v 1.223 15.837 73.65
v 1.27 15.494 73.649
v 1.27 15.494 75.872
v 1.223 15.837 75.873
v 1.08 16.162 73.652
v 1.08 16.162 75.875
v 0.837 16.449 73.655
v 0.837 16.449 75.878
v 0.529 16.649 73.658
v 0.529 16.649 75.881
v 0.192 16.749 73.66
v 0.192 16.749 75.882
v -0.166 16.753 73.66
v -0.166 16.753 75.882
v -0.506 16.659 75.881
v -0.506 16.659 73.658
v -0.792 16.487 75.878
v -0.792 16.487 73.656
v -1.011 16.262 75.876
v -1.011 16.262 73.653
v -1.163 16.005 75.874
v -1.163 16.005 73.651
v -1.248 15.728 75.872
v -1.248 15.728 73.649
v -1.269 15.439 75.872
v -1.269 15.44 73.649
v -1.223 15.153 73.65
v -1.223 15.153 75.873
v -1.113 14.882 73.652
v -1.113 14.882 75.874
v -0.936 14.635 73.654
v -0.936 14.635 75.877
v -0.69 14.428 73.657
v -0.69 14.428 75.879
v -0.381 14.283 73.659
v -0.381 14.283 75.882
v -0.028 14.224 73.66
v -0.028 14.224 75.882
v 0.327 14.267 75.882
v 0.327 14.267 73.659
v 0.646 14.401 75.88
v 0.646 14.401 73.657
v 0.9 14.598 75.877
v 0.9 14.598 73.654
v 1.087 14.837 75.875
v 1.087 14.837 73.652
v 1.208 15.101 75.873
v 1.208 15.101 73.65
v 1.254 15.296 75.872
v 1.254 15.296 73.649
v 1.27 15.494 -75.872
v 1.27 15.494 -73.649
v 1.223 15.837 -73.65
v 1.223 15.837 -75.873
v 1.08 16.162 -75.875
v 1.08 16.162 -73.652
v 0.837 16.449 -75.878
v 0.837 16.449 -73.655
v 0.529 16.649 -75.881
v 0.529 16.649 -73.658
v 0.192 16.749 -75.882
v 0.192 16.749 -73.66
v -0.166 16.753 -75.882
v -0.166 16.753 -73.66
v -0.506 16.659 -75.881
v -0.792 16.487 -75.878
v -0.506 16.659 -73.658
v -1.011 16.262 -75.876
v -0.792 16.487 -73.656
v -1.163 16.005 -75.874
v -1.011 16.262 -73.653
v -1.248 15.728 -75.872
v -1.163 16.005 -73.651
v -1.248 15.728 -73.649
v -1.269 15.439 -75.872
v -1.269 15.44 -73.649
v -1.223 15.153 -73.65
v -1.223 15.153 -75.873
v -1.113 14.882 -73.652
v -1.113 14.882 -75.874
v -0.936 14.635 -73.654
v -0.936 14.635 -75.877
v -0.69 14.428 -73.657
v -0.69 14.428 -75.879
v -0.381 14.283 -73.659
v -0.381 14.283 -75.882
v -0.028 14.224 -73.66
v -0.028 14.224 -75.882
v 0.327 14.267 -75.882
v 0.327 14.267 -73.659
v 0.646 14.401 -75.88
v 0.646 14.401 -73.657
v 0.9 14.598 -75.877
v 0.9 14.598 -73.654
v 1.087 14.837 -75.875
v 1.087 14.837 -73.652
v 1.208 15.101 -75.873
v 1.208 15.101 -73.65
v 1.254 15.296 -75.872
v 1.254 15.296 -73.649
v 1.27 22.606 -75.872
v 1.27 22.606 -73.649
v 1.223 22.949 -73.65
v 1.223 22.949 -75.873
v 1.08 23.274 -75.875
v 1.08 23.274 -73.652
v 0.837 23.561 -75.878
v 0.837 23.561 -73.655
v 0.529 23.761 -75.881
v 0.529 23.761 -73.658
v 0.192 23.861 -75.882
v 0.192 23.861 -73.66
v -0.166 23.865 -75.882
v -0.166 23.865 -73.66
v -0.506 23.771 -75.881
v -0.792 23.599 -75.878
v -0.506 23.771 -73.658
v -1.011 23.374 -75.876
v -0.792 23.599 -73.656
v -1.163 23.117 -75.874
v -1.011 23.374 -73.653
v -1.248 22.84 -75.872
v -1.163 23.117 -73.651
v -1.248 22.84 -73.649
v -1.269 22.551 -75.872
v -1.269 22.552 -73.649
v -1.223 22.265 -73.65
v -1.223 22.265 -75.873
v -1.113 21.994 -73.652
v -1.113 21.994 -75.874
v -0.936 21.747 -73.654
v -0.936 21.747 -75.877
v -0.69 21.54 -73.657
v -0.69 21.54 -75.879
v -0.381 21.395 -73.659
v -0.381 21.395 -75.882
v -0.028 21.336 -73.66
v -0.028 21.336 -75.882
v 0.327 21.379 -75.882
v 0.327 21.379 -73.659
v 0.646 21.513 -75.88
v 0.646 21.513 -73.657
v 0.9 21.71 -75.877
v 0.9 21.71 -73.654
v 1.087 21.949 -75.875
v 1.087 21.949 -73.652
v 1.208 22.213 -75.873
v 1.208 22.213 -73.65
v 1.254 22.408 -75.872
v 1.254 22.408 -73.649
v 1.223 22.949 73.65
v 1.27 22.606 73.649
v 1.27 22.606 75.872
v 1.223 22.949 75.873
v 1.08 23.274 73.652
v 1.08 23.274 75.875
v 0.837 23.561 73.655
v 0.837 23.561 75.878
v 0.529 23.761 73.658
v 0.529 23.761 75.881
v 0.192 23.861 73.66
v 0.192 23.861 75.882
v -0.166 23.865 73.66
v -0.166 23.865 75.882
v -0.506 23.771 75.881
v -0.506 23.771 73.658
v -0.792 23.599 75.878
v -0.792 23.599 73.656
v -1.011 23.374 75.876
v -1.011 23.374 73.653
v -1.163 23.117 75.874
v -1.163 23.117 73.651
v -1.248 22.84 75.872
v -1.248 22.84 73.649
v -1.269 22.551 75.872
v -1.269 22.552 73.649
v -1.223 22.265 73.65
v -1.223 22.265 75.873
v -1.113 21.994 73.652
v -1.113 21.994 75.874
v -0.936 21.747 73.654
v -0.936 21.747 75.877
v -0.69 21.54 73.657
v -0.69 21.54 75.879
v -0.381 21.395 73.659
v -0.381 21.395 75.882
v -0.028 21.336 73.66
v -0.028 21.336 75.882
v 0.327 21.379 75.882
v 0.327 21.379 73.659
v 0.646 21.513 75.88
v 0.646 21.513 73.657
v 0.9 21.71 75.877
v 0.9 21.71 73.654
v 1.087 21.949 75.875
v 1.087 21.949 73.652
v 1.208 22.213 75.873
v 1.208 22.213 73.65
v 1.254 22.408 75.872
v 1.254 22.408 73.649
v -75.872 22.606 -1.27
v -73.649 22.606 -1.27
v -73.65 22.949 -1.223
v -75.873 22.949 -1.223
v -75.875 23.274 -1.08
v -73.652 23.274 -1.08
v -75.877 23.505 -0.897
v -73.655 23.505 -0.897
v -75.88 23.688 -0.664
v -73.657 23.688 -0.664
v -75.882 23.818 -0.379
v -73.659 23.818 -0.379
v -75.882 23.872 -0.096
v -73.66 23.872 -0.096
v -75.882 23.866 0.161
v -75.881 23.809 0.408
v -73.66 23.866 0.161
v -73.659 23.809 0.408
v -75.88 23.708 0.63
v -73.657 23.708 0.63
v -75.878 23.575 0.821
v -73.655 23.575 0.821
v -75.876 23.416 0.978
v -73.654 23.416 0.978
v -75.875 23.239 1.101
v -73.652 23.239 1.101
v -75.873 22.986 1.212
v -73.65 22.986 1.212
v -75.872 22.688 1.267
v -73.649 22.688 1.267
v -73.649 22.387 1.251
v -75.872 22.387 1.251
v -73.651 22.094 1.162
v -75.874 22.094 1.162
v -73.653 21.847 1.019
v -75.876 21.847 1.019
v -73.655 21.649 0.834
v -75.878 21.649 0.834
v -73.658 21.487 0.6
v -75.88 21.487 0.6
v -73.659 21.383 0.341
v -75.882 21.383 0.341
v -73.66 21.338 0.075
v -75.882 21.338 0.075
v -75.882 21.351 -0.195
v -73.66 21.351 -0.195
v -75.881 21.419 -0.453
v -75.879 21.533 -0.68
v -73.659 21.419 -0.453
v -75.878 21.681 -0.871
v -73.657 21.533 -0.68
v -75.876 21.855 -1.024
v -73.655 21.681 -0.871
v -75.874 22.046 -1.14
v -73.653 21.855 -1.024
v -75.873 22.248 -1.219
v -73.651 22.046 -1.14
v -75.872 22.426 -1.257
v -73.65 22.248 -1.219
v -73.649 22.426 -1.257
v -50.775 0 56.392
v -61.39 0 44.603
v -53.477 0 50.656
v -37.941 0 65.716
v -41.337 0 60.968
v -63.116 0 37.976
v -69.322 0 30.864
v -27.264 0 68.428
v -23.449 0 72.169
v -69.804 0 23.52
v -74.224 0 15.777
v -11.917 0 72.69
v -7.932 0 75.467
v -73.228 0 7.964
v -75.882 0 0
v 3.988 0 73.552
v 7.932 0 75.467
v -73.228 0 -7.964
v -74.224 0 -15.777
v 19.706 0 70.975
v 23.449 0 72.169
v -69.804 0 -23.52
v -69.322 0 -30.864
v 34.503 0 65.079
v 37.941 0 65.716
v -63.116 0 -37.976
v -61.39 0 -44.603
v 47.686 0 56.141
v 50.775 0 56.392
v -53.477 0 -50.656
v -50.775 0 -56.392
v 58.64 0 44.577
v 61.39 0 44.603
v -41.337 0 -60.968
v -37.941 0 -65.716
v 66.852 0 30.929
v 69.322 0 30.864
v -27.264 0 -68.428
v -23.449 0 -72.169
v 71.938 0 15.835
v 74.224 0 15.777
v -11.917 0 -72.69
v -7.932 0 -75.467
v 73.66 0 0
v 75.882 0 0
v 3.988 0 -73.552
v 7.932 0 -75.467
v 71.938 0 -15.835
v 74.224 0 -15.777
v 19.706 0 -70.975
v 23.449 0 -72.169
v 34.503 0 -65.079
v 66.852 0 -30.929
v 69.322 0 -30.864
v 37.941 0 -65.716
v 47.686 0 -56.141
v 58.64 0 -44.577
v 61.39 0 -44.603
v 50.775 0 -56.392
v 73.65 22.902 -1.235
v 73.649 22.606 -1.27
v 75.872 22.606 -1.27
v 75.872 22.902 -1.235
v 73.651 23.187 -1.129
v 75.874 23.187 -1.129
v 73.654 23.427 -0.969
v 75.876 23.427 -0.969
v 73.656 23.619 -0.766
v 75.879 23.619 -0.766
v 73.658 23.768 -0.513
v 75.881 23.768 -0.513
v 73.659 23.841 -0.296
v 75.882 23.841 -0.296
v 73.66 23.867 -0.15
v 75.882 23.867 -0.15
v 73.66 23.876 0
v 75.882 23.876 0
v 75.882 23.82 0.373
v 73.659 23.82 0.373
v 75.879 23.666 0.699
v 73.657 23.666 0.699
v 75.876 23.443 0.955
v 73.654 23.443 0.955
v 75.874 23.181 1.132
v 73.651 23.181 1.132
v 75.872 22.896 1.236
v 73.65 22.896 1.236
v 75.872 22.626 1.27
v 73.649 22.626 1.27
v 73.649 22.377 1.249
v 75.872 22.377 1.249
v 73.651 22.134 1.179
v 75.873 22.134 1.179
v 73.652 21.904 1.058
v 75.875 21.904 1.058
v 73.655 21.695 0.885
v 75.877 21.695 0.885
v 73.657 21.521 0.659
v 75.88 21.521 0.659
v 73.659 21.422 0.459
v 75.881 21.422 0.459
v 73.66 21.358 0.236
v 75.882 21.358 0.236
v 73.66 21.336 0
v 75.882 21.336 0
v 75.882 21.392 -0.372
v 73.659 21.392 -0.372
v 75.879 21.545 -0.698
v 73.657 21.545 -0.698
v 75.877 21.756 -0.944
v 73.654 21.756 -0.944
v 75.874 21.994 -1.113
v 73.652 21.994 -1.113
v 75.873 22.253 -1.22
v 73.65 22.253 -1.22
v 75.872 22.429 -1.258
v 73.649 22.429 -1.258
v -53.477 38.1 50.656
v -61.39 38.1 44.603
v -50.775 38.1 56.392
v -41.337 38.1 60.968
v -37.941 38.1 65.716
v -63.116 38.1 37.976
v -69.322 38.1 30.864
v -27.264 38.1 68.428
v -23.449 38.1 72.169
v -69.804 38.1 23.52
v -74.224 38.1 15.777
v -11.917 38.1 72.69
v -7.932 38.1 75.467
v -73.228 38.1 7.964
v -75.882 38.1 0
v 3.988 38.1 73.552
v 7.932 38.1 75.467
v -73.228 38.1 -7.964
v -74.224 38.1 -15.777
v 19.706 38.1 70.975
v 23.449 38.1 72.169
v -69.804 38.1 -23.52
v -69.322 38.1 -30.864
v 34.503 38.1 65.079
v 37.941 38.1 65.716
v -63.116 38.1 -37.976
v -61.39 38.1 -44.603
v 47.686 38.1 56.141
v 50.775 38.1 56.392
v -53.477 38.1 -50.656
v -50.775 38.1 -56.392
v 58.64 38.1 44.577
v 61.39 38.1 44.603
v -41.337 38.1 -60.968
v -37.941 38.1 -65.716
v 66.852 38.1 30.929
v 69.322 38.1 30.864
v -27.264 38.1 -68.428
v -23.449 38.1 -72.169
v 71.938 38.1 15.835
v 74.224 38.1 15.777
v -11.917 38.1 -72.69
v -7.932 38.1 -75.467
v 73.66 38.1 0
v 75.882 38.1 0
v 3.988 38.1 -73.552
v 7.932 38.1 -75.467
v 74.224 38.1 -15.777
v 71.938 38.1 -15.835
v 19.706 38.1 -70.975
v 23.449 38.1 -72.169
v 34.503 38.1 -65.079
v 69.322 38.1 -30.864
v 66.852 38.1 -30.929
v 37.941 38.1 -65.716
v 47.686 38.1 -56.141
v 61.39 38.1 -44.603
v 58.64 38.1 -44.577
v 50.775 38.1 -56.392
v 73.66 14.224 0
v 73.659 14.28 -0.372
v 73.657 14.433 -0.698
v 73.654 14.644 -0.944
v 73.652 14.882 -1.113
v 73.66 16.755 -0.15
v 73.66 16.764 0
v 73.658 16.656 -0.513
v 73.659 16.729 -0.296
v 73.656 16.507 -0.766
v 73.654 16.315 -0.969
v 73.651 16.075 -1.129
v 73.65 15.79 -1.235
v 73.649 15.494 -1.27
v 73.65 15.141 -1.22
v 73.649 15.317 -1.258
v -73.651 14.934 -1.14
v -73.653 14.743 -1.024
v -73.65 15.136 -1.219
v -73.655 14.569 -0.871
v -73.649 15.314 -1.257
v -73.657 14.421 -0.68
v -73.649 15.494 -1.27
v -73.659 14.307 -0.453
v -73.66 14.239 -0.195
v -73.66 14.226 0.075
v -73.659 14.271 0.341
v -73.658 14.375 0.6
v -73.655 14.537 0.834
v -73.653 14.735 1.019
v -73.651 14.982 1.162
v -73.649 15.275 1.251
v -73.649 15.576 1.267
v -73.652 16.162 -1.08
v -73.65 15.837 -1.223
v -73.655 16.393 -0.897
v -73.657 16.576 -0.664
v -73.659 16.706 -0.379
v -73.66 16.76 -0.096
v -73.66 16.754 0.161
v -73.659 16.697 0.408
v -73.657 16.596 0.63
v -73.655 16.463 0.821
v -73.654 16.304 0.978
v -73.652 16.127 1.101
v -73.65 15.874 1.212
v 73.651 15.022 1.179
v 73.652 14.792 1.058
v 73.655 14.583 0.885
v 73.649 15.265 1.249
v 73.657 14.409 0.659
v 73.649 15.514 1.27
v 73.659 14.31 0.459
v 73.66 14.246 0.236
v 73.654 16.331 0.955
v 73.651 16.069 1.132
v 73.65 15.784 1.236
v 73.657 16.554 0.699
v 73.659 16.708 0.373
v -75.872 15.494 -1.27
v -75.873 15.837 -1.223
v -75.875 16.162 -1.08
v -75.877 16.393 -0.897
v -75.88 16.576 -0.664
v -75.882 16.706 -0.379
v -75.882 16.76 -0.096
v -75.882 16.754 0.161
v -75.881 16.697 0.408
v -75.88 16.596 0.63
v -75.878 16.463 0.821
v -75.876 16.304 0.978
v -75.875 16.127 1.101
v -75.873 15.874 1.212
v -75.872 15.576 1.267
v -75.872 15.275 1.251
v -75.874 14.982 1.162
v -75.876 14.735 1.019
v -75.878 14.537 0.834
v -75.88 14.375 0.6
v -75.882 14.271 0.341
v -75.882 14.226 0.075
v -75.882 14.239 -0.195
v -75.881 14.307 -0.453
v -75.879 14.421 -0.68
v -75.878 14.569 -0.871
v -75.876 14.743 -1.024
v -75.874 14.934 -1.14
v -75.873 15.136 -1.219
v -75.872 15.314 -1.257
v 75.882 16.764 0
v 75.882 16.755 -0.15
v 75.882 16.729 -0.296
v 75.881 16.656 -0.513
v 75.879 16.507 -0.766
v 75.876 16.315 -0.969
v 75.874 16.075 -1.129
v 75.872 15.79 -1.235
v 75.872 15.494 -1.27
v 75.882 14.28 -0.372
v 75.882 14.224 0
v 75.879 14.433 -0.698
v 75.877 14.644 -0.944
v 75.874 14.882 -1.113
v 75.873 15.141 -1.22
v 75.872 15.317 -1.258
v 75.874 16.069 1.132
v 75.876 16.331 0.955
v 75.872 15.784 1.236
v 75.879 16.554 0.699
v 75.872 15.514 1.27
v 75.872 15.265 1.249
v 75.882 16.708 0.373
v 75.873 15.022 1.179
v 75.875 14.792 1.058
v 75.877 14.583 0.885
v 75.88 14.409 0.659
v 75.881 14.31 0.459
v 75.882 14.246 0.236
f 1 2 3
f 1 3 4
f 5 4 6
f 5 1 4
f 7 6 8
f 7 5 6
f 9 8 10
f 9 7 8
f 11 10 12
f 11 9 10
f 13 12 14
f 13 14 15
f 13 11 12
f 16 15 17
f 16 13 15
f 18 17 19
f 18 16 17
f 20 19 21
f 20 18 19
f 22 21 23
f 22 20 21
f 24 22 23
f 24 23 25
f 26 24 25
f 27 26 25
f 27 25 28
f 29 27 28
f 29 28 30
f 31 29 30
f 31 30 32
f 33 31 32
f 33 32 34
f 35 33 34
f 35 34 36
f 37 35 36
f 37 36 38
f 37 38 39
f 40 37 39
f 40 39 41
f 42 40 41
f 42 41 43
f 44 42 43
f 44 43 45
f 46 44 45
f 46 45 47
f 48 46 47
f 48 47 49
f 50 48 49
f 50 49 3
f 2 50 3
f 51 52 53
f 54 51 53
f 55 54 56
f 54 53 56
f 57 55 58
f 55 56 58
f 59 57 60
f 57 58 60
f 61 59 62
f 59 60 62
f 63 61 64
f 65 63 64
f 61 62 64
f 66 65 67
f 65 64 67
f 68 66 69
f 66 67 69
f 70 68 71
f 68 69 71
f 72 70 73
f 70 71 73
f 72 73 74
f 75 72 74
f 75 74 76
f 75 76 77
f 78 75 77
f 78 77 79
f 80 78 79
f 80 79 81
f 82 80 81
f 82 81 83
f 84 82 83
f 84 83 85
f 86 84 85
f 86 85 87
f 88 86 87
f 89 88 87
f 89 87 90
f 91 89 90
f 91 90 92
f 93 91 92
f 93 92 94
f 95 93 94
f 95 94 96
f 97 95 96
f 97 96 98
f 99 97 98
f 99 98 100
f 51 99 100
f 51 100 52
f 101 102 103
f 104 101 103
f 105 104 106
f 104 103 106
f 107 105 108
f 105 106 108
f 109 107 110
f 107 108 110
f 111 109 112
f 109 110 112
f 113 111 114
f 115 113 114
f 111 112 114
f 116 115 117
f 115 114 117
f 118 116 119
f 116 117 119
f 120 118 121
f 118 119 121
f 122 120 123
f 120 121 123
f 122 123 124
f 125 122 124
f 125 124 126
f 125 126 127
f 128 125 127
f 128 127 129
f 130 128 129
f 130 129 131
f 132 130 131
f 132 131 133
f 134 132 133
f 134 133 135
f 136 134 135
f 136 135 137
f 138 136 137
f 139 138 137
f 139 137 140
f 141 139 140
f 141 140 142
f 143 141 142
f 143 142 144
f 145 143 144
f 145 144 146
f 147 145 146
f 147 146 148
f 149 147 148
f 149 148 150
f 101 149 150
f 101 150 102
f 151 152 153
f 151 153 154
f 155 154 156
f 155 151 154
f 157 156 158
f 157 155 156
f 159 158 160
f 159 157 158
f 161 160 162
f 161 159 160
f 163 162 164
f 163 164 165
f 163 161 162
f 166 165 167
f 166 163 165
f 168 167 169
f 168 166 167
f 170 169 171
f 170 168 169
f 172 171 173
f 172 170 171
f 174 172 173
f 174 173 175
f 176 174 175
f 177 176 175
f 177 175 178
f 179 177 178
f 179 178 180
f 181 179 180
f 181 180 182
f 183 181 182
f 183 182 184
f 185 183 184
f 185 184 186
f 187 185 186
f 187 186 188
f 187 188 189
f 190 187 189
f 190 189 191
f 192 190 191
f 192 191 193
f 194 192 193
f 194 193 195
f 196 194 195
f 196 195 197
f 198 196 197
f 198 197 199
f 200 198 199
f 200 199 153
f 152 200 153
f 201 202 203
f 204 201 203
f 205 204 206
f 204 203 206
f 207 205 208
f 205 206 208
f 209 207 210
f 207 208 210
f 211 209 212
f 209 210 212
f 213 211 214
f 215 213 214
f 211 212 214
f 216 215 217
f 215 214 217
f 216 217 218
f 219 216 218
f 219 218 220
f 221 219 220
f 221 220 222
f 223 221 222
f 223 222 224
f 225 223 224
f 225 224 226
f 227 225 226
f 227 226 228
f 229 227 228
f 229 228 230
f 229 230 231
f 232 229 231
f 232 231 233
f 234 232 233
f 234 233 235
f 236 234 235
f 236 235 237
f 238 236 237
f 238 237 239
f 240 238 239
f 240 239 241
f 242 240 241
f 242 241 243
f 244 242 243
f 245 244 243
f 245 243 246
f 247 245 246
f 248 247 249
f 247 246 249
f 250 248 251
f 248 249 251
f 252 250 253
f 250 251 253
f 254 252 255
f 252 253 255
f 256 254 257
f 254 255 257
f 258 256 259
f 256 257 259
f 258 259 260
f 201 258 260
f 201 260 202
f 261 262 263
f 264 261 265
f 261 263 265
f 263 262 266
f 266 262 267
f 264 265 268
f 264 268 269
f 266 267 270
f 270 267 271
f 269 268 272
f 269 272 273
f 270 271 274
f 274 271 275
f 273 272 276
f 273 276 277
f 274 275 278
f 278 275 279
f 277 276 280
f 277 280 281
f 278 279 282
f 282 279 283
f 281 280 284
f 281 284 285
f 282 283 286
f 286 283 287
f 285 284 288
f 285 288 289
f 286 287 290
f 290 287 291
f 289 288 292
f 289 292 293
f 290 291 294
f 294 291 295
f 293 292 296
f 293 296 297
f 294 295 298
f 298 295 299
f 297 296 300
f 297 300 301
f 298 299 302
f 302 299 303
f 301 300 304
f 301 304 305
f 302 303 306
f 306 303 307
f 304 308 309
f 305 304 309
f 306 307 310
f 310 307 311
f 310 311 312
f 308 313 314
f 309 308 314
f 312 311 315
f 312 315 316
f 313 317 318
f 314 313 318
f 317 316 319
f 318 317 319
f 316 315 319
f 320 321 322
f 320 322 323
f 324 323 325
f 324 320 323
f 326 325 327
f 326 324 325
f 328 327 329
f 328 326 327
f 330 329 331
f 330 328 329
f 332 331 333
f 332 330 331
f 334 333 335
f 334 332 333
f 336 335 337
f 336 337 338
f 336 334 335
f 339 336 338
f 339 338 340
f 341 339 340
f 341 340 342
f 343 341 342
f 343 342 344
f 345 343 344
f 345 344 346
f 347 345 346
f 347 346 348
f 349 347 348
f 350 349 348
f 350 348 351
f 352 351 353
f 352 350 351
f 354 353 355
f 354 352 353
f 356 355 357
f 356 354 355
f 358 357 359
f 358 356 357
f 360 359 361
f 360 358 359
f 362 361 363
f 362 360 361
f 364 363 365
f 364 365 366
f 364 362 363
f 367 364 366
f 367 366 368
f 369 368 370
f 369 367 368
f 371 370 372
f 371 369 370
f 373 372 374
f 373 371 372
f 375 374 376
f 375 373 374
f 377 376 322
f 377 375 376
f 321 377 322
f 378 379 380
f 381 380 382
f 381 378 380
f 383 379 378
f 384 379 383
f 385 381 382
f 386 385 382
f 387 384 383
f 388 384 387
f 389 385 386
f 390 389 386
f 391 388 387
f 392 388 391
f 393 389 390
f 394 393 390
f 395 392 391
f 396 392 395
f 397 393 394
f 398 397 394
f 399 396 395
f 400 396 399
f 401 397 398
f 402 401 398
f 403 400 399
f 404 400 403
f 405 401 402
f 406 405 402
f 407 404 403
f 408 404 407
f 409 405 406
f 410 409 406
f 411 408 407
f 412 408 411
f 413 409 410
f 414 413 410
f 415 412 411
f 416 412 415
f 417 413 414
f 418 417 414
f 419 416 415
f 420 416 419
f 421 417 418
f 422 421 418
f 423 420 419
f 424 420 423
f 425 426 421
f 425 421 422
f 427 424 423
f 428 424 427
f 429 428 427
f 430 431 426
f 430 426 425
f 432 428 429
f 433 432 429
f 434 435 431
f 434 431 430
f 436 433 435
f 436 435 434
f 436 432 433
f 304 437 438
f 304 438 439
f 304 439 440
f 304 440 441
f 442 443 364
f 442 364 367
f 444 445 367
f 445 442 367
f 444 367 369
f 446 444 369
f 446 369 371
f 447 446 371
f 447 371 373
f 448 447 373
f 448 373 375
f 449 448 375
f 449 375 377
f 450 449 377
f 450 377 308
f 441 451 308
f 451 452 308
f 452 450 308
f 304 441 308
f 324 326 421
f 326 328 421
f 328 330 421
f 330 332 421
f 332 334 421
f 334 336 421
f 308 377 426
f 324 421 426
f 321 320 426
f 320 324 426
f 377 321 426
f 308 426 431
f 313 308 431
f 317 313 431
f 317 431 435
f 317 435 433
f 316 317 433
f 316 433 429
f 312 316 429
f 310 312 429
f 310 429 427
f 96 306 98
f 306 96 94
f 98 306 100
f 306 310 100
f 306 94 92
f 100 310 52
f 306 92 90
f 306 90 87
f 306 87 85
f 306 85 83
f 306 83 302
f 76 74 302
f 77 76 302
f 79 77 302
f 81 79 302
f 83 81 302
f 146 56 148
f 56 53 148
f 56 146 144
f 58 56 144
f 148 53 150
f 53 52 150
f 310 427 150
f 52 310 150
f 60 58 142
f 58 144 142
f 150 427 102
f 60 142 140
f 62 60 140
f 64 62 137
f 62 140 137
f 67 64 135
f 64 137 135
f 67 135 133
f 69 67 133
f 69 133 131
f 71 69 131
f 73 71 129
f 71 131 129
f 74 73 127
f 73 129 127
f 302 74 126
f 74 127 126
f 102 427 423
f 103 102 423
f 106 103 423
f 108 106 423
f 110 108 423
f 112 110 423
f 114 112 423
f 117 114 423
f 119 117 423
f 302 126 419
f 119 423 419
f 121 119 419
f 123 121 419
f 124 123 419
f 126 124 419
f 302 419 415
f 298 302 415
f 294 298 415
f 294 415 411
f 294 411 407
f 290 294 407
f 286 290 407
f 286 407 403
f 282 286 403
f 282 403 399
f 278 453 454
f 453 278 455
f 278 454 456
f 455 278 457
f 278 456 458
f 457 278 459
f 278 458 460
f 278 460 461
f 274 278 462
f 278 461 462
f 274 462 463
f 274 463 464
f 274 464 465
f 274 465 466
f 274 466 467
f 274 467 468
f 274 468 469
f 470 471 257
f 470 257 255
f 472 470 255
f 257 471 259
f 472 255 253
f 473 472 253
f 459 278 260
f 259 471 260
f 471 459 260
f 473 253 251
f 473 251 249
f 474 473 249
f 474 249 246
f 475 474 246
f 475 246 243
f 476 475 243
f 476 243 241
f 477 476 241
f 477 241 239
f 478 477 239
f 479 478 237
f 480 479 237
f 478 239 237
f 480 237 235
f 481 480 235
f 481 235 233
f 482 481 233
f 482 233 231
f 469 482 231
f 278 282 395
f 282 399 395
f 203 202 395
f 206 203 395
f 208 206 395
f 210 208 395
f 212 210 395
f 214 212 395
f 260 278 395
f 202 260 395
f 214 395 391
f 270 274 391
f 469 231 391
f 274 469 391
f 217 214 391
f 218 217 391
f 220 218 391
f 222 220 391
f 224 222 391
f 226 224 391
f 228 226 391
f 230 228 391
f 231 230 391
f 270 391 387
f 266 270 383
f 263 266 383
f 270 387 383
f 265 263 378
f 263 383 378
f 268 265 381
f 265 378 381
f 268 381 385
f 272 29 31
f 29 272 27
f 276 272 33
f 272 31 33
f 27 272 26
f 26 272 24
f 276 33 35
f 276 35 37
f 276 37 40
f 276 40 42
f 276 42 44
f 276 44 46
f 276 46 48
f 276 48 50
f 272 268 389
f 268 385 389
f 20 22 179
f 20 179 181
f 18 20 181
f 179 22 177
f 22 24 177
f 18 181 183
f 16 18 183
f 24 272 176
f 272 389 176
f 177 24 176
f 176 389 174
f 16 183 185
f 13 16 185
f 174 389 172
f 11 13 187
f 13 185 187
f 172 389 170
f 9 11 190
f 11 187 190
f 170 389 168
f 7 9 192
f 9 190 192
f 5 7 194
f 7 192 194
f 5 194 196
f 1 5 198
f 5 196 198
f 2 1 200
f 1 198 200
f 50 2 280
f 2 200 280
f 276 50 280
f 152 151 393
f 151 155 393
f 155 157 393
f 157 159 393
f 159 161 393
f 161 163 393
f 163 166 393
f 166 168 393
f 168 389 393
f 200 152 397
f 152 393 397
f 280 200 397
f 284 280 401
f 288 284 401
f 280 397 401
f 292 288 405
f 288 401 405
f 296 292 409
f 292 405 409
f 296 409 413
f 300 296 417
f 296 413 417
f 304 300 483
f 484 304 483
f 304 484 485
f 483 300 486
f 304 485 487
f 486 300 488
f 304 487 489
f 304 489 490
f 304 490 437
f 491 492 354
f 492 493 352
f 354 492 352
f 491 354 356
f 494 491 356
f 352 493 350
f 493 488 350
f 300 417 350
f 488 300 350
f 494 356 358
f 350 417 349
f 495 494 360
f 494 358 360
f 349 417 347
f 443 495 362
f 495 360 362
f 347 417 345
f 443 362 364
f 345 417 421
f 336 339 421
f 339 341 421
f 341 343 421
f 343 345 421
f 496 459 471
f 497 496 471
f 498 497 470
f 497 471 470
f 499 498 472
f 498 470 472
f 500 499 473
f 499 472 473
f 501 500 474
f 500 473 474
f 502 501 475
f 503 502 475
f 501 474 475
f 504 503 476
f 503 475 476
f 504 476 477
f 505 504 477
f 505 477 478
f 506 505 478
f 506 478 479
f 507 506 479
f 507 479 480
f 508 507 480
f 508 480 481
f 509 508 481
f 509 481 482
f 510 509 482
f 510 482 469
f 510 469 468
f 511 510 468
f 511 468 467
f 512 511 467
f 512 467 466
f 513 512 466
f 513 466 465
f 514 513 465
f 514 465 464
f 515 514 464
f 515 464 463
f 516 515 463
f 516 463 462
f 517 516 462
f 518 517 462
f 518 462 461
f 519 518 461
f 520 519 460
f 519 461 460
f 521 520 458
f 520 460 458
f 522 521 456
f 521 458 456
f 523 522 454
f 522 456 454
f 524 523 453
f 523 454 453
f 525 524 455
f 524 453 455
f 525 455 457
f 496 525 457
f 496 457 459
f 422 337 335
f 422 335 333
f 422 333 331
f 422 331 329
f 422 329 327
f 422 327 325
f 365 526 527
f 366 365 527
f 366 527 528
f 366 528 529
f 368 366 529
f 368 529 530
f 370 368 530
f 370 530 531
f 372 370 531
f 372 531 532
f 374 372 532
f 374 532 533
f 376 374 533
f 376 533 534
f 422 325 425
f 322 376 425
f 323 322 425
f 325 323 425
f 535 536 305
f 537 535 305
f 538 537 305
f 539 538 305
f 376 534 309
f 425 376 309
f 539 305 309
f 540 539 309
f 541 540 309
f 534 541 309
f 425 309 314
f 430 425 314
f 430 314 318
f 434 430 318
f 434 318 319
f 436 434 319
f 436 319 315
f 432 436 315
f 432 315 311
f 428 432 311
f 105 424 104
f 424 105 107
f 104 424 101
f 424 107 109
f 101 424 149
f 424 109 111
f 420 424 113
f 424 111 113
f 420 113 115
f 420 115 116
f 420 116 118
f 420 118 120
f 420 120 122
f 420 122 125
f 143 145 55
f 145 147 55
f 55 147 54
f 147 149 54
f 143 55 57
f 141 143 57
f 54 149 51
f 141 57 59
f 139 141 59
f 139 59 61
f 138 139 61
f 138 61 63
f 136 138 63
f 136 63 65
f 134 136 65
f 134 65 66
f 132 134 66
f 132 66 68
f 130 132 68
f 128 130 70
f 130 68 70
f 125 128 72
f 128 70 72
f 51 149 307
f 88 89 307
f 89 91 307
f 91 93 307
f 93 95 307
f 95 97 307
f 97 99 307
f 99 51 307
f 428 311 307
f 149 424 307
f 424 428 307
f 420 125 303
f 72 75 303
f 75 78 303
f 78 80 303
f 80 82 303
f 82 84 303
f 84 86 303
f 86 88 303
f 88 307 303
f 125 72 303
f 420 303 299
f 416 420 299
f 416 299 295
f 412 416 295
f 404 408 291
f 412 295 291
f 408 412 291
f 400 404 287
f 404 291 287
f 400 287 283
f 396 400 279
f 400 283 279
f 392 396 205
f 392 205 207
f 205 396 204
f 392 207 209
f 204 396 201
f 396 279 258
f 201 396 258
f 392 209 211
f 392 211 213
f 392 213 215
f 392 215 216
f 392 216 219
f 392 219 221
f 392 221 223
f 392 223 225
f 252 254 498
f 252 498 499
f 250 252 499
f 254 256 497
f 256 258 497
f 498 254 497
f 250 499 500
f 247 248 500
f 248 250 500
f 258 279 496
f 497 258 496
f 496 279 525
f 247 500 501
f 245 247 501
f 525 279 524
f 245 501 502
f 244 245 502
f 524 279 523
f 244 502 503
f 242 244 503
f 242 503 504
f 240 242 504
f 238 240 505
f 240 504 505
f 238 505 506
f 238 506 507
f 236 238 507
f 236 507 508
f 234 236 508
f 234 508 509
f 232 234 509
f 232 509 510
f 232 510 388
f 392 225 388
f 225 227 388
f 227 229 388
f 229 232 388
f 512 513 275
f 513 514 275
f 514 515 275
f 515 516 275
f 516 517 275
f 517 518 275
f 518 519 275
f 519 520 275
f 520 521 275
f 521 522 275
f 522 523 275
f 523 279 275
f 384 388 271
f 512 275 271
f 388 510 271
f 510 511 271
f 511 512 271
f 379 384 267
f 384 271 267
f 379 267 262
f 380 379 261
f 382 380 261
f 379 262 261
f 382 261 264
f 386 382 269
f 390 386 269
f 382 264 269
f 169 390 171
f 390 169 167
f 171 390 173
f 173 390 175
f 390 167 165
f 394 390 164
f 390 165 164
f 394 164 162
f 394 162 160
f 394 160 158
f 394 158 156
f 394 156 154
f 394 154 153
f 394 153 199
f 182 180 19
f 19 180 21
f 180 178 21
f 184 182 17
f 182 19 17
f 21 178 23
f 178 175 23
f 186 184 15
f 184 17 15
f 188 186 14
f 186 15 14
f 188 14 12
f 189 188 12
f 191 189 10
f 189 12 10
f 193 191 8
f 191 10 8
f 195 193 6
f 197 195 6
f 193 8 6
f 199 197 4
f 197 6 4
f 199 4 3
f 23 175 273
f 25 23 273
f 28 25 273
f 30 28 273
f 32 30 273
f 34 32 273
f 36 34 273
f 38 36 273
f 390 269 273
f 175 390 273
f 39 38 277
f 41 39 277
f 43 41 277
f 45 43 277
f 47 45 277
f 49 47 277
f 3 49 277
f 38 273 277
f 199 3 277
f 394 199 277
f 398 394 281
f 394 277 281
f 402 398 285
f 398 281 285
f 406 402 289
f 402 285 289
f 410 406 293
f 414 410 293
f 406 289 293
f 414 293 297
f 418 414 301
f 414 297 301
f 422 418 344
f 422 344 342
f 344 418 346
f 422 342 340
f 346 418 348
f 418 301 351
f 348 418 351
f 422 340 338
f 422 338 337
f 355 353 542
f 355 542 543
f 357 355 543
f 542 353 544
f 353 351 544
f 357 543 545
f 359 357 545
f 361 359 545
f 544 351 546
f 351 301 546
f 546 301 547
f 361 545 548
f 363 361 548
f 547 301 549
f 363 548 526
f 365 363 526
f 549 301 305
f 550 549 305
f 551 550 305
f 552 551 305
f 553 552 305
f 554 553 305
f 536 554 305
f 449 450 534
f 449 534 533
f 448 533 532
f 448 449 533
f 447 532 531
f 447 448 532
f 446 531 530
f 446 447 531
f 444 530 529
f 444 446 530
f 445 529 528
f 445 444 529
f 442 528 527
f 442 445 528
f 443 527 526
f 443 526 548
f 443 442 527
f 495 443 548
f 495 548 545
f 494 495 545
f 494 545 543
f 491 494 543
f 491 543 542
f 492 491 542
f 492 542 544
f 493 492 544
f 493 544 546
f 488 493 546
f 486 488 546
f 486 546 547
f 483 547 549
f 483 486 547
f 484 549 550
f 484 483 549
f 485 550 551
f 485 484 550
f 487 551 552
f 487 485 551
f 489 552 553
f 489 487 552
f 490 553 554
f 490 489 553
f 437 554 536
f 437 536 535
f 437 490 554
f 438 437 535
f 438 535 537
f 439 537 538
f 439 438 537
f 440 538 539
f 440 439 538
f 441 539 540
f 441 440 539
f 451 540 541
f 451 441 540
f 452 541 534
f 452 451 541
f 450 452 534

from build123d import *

# Parameters (mm, degrees)
SKETCH1_R               = 75.8825
BOSS_EXTRUDE1_DEPTH     = 38.1
SKETCH2_R               = 73.66
CUT_EXTRUDE1_DEPTH      = 101.6
SKETCH4_R               = 1.27
CUT_EXTRUDE3_DEPTH      = 76.8825
CUT_EXTRUDE3_DEPTH_BACK = 76.8825
SKETCH5_R               = 1.27
CUT_EXTRUDE4_DEPTH      = 76.8825001
CUT_EXTRUDE4_DEPTH_BACK = 76.8825001


with BuildPart() as part:
    # Sketch1 → Boss-Extrude1 (new body)
    with BuildSketch(Plane(origin=(0, 0, 0), x_dir=(1, 0, 0), z_dir=(0, 1, 0))):
        Circle(SKETCH1_R)
    extrude(amount=BOSS_EXTRUDE1_DEPTH)

    # Sketch2 → Cut-Extrude1 (cut)
    with BuildSketch(Plane(origin=(0, 38.1, 0), x_dir=(1, 0, 0), z_dir=(0, 1, 0))):
        Circle(SKETCH2_R)
    extrude(amount=-CUT_EXTRUDE1_DEPTH, mode=Mode.SUBTRACT)

    # Sketch4 → Cut-Extrude3 (cut, two sides)
    with BuildSketch(Plane(origin=(0, 0, 0), x_dir=(0, 0, -1), z_dir=(1, 0, 0))) as cut_extrude3_sk:
        with Locations((4.12e-07, 22.606)):
            Circle(SKETCH4_R)
        with Locations((4.12e-07, 15.494)):
            Circle(SKETCH4_R)
    extrude(amount=CUT_EXTRUDE3_DEPTH, mode=Mode.SUBTRACT)
    extrude(cut_extrude3_sk.sketch, amount=-CUT_EXTRUDE3_DEPTH_BACK, mode=Mode.SUBTRACT)

    # Sketch5 → Cut-Extrude4 (cut, two sides)
    with BuildSketch(Plane.XY) as cut_extrude4_sk:
        with Locations((7.8e-08, 15.493965738)):
            Circle(SKETCH5_R)
        with Locations((6.87e-07, 22.605965738)):
            Circle(SKETCH5_R)
    extrude(amount=CUT_EXTRUDE4_DEPTH, mode=Mode.SUBTRACT)
    extrude(cut_extrude4_sk.sketch, amount=-CUT_EXTRUDE4_DEPTH_BACK, mode=Mode.SUBTRACT)


solid = part.part
